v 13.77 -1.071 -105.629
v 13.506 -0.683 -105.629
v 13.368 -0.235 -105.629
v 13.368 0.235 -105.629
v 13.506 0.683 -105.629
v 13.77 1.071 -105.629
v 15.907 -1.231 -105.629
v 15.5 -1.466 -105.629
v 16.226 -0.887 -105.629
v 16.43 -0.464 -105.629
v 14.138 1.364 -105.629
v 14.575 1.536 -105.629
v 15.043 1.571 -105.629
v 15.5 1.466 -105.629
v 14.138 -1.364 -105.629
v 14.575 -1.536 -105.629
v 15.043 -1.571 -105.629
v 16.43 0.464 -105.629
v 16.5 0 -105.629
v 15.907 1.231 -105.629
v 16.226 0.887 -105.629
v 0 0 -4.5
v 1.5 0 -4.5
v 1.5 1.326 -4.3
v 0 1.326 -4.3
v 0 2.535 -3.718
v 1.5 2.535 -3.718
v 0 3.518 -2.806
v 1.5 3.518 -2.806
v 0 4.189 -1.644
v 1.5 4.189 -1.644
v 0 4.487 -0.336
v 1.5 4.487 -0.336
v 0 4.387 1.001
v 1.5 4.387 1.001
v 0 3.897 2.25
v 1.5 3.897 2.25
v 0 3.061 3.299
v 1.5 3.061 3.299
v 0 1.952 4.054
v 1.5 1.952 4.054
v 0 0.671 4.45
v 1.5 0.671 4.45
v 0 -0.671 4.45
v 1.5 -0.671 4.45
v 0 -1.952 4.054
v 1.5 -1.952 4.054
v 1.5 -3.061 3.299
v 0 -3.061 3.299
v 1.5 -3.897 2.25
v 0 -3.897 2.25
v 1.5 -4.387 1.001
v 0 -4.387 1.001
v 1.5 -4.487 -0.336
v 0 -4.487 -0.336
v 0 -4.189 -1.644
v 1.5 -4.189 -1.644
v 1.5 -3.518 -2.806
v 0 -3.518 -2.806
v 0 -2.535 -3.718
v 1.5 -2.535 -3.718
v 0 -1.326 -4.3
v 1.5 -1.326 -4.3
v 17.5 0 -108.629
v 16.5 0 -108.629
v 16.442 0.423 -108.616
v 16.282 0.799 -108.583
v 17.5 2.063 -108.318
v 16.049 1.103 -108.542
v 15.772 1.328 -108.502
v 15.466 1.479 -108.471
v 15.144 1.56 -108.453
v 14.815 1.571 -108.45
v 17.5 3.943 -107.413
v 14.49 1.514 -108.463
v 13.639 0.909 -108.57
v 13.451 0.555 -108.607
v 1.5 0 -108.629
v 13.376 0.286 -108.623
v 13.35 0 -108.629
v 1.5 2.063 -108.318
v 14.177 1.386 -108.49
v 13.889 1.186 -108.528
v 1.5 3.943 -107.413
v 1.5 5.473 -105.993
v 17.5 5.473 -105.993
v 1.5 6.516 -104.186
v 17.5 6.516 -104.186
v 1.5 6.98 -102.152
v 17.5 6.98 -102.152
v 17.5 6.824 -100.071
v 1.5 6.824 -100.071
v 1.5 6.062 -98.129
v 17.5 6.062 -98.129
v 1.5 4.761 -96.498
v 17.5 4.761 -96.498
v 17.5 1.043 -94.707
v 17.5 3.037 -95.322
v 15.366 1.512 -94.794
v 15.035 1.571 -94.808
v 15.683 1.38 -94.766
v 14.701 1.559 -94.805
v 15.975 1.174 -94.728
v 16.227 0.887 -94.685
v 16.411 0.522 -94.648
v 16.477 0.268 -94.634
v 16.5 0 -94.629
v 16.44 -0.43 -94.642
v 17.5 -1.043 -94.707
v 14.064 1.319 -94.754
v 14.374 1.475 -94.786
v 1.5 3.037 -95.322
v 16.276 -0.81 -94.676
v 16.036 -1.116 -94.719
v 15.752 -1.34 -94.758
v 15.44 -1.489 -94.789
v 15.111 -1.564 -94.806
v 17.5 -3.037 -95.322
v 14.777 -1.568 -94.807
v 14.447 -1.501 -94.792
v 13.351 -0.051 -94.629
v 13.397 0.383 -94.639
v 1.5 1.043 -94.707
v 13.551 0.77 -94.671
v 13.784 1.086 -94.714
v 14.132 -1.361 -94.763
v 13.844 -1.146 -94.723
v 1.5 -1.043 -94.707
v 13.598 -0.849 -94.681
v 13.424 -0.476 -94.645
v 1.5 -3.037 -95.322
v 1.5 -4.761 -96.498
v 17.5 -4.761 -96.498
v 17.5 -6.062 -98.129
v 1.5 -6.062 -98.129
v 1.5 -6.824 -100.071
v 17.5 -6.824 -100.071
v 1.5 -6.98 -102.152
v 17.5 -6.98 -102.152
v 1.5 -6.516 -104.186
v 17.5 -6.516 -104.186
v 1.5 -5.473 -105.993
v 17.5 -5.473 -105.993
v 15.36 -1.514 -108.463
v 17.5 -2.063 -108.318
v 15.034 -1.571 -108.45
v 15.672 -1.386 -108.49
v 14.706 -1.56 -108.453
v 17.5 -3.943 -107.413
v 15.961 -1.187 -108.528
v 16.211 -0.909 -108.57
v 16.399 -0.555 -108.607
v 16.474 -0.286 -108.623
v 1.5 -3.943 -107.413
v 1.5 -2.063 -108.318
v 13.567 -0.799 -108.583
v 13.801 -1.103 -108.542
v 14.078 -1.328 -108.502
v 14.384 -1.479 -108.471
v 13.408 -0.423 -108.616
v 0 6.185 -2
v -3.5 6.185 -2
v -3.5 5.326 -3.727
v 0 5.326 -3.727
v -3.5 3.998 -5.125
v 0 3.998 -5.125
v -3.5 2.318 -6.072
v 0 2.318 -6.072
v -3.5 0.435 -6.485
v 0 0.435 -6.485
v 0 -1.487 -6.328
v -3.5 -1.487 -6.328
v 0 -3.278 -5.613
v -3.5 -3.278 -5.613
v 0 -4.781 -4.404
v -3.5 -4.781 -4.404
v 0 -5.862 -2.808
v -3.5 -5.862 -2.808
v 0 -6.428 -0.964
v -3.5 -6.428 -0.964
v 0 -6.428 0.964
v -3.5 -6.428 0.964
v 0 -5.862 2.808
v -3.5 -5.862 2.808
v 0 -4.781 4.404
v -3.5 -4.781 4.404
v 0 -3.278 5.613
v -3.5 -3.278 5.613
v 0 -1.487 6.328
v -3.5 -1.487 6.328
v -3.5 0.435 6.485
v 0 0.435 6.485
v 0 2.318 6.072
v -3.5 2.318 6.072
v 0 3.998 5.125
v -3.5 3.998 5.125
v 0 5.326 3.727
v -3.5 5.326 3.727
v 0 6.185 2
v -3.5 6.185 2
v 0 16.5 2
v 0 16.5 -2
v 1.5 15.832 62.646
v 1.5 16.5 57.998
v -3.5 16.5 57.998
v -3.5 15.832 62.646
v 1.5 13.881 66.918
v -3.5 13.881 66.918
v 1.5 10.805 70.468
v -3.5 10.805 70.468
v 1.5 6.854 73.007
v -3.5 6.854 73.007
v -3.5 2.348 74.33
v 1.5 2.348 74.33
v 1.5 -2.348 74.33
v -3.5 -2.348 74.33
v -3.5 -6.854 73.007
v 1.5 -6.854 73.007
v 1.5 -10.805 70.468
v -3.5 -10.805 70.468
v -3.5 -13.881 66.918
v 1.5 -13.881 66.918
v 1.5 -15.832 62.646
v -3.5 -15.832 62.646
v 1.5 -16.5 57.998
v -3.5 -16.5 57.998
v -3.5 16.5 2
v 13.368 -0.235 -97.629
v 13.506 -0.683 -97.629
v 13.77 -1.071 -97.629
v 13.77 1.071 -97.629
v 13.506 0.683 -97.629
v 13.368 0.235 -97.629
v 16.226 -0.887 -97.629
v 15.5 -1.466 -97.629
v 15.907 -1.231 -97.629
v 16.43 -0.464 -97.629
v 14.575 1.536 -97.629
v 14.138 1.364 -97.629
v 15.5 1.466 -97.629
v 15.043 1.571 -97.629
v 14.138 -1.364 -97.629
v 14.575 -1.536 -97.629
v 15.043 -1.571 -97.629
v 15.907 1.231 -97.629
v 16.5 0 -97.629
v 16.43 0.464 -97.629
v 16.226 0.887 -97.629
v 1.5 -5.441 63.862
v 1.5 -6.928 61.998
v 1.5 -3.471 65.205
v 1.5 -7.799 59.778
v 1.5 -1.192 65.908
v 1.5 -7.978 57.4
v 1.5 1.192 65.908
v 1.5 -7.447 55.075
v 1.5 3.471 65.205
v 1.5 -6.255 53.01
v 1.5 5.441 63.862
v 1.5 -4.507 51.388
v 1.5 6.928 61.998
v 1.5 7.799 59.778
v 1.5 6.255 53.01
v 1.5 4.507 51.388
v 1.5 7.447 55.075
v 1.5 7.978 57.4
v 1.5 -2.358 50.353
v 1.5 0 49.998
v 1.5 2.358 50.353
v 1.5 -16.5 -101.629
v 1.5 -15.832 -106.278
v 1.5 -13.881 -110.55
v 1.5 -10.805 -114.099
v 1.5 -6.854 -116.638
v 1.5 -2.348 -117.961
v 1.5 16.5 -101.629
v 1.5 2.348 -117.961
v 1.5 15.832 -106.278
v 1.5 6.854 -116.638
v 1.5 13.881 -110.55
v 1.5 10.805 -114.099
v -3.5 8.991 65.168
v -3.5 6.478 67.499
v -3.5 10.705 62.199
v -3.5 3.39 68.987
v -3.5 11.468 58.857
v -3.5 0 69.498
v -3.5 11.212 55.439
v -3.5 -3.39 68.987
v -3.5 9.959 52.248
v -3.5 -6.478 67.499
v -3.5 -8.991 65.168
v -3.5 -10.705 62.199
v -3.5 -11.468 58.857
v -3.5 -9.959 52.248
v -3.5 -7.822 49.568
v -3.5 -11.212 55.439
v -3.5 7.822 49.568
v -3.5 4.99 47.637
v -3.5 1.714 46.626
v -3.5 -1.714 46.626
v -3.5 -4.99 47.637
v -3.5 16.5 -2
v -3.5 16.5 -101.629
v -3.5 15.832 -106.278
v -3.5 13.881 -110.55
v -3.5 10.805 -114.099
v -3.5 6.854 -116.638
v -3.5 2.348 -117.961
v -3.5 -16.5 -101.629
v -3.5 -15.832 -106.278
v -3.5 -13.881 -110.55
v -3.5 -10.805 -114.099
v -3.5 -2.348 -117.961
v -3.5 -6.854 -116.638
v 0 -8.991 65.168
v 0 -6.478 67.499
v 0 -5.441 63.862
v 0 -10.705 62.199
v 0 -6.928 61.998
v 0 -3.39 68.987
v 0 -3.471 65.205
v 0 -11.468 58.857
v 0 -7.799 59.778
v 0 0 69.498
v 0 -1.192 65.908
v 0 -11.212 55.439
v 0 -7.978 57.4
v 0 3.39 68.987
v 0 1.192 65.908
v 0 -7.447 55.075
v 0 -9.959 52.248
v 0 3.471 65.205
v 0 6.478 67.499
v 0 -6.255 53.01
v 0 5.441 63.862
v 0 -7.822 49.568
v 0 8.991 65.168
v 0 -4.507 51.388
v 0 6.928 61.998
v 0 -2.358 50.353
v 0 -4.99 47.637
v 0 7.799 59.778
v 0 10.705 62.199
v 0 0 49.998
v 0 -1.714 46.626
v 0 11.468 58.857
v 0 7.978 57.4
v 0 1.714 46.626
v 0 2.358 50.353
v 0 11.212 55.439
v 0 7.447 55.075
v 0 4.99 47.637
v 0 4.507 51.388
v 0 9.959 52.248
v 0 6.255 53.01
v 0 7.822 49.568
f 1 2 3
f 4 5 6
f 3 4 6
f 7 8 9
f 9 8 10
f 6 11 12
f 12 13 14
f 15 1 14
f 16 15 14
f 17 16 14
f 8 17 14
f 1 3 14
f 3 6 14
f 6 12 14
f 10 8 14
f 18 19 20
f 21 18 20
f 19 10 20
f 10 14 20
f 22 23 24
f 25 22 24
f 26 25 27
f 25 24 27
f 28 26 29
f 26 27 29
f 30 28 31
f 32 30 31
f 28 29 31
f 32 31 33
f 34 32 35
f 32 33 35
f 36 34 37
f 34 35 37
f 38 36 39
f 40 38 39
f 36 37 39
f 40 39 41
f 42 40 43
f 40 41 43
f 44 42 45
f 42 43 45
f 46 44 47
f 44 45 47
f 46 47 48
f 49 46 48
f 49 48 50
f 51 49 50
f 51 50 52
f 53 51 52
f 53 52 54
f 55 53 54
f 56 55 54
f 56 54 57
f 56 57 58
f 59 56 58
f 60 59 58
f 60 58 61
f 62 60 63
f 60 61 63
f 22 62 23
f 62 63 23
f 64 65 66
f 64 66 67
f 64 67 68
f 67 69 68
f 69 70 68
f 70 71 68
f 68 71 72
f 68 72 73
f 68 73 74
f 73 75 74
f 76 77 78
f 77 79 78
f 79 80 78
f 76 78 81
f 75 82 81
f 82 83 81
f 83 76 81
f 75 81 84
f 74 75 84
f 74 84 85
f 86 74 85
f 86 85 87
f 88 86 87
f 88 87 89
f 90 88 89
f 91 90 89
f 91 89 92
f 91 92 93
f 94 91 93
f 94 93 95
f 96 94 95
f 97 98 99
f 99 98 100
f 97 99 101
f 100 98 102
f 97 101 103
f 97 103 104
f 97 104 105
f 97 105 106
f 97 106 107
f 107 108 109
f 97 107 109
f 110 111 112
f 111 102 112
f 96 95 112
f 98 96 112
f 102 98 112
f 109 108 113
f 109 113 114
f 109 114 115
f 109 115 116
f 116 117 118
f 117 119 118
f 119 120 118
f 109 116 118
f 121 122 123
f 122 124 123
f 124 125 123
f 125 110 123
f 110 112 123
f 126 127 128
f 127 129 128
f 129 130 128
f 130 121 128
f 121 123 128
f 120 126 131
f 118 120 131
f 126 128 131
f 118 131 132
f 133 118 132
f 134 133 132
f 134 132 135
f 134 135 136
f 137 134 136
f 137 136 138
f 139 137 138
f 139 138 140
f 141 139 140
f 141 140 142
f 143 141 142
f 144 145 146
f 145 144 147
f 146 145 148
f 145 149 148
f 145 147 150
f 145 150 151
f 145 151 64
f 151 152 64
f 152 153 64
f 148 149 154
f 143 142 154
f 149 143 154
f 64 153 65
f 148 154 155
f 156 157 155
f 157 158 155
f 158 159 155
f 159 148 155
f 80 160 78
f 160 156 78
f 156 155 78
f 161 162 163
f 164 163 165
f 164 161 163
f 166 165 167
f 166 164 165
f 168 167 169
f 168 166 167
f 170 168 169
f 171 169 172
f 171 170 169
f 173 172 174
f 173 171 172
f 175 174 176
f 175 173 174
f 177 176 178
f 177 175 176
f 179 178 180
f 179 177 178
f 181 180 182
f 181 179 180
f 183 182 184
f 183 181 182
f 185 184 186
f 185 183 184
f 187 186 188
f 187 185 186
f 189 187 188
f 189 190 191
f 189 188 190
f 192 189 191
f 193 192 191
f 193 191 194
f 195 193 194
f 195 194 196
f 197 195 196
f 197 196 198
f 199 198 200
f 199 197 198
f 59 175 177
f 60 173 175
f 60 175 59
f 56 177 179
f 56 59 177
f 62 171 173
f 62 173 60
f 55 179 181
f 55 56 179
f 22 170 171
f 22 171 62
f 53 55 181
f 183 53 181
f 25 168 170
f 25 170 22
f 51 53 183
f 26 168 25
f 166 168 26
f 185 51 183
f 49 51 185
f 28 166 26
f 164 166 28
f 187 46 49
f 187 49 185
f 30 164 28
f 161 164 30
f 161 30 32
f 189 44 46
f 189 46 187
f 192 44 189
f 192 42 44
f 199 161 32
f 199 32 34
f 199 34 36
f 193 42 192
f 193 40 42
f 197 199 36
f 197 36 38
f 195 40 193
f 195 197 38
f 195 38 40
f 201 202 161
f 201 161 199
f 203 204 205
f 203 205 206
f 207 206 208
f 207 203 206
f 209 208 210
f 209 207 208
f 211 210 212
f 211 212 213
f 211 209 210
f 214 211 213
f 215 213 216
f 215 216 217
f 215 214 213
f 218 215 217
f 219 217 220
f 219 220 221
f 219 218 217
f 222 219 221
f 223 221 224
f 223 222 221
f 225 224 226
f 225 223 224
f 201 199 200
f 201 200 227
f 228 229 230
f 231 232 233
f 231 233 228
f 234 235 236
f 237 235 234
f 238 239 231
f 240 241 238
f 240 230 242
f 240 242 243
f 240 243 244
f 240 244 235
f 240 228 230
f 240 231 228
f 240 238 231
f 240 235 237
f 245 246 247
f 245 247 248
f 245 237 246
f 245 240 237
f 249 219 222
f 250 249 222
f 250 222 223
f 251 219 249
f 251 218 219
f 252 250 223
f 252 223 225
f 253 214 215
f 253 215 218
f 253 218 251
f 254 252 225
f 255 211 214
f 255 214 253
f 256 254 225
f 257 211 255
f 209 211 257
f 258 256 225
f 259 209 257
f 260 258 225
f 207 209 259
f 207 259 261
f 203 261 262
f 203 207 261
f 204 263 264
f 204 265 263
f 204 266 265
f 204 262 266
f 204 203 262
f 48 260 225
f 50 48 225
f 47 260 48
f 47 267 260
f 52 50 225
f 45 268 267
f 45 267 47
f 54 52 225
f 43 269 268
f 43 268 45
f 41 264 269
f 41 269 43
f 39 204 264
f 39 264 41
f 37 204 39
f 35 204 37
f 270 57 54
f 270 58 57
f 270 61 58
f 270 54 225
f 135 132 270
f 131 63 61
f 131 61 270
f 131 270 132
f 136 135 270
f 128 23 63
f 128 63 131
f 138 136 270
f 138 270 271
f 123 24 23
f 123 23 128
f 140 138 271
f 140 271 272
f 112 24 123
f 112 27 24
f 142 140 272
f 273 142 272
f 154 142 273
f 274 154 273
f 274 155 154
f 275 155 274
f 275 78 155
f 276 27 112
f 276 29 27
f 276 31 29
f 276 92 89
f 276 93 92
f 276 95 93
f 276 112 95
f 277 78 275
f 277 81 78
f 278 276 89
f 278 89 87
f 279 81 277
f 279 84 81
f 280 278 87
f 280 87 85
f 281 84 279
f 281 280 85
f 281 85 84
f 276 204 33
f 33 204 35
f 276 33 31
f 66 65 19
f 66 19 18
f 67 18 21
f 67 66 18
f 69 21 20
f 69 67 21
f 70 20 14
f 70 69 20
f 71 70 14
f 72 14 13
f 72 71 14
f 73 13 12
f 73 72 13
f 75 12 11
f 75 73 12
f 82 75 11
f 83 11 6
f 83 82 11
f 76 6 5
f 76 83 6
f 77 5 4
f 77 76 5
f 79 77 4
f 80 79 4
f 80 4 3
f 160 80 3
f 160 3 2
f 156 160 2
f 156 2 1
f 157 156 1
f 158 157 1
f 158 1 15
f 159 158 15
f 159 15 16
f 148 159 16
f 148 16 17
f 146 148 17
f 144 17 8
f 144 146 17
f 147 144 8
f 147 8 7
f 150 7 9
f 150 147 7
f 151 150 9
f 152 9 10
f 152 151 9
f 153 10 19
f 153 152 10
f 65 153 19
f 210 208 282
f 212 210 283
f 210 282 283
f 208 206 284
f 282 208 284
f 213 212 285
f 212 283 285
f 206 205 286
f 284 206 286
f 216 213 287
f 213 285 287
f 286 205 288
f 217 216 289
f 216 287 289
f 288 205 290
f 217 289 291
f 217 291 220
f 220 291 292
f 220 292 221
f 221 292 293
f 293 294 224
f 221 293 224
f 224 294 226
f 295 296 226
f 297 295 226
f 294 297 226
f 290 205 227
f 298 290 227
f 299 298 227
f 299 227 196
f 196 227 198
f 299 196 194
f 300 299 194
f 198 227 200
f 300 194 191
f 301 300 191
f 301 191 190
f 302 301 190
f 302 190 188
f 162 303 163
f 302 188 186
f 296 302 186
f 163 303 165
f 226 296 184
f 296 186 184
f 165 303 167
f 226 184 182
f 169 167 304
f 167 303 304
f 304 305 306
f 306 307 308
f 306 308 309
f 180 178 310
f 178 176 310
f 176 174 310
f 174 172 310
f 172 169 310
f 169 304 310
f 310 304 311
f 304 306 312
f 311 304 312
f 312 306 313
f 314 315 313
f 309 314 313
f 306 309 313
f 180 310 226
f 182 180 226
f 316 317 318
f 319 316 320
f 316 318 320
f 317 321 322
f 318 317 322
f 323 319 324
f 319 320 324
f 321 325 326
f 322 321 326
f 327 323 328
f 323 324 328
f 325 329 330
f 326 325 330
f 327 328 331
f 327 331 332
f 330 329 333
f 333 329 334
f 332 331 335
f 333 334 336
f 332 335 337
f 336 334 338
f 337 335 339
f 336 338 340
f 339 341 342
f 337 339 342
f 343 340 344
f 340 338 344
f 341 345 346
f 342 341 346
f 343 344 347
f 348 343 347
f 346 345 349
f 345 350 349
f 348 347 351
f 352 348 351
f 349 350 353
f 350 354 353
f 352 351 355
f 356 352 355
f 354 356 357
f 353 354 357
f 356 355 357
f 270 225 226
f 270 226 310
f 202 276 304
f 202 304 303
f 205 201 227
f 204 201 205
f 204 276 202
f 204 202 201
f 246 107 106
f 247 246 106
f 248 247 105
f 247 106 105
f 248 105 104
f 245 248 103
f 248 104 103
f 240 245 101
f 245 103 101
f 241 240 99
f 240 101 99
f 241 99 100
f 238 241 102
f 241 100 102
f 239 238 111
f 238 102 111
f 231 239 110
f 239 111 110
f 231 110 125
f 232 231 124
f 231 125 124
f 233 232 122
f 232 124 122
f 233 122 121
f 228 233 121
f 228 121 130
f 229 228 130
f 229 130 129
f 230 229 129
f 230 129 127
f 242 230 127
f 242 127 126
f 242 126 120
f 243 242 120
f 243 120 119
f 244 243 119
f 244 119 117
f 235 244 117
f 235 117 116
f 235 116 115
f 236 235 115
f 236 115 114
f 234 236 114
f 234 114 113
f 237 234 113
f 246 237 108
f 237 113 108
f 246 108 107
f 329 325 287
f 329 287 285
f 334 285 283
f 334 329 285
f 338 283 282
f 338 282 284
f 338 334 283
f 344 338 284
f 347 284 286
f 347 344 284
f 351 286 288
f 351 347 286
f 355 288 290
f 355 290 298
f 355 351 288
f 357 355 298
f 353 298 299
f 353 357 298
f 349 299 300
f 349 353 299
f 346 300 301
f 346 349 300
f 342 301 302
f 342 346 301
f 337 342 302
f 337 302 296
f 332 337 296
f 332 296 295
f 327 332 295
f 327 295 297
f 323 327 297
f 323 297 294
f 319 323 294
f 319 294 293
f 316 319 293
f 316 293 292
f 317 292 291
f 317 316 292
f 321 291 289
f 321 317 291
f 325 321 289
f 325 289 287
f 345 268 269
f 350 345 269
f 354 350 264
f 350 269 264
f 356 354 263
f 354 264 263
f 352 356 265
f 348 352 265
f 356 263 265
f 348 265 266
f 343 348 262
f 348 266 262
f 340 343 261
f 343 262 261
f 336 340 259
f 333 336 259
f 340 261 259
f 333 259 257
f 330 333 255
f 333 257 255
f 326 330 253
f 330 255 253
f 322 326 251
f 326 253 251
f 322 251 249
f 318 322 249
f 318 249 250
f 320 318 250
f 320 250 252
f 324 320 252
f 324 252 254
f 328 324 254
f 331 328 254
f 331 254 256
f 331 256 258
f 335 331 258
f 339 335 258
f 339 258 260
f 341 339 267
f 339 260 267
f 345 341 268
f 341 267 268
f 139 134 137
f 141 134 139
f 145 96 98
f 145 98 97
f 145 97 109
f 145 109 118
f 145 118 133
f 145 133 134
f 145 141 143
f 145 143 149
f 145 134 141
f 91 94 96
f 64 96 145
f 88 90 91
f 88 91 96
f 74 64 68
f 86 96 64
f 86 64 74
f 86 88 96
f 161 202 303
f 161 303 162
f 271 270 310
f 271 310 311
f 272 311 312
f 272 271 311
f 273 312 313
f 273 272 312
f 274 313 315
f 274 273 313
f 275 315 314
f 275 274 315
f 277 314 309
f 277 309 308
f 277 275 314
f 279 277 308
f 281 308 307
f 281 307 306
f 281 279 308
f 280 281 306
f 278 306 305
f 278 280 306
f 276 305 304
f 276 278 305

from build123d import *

# Parameters (mm, degrees)
SKETCH3_R           = 6.5
SKETCH3_R_2         = 11.5
BOSS_EXTRUDE2_DEPTH = 3.5
BOSS_EXTRUDE3_START = 1.5
SKETCH4_R           = 8
SKETCH4_R_2         = 4.5
BOSS_EXTRUDE3_DEPTH = 1.5
SKETCH6_R           = 7
BOSS_EXTRUDE4_DEPTH = 16
CUT_EXTRUDE1_START  = -3.5
CUT_EXTRUDE1_DEPTH  = 3.5
SKETCH8_R           = 1.575
CUT_EXTRUDE2_DEPTH  = 3


with BuildPart() as part:
    # Sketch3 → Boss-Extrude2 (new body)
    with BuildSketch(Plane(origin=(0, 20, 0), x_dir=(0, 1, 0), z_dir=(-1, 0, 0))):
        with BuildLine():
            Line((-3.5, 101.628977271), (-3.5, -57.9976886))
            ThreePointArc((-3.5, -57.9976886), (-20, -74.4976886), (-36.5, -57.9976886))
            Line((-36.5, -57.9976886), (-36.5, 101.628977271))
            ThreePointArc((-36.5, 101.628977271), (-20, 118.128977271), (-3.5, 101.628977271))
        make_face()
        with Locations(Location((-20, 0, 0), (0, 0, 270))):
            Circle(SKETCH3_R, mode=Mode.SUBTRACT)
        with Locations(Location((-20, -57.9976886, 0), (0, 0, 270))):
            Circle(SKETCH3_R_2, mode=Mode.SUBTRACT)
    extrude(amount=BOSS_EXTRUDE2_DEPTH)

    # Sketch4 → Boss-Extrude3 (add)
    with BuildSketch(Plane(origin=(0, 0, 0), x_dir=(0, 0, -1), z_dir=(1, 0, 0)).offset(BOSS_EXTRUDE3_START)):
        with BuildLine():
            Line((101.628977271, 16.5), (-57.9976886, 16.5))
            ThreePointArc((-57.9976886, 16.5), (-74.4976886, 0), (-57.9976886, -16.5))
            Line((-57.9976886, -16.5), (101.628977271, -16.5))
            ThreePointArc((101.628977271, -16.5), (118.128977271, 0), (101.628977271, 16.5))
        make_face()
        with Locations((-57.9976886, 0)):
            Circle(SKETCH4_R, mode=Mode.SUBTRACT)
        Circle(SKETCH4_R_2, mode=Mode.SUBTRACT)
    extrude(amount=-BOSS_EXTRUDE3_DEPTH)

    # Sketch6 → Boss-Extrude4 (add)
    with BuildSketch(Plane(origin=(1.5, 0, 0), x_dir=(0, 0, -1), z_dir=(1, 0, 0))):
        with Locations((101.628977271, 0)):
            Circle(SKETCH6_R)
    extrude(amount=BOSS_EXTRUDE4_DEPTH)

    # Sketch7 → Cut-Extrude1 (cut)
    with BuildSketch(Plane.ZY.offset(3.5).offset(CUT_EXTRUDE1_START)):
        with BuildLine():
            Line((-2, 16.5), (-2, 6.184658438))
            ThreePointArc((-2, 6.184658438), (0, 6.5), (2, 6.184658438))
            Line((2, 6.184658438), (2, 16.5))
            Line((2, 16.5), (-2, 16.5))
        make_face()
    extrude(amount=CUT_EXTRUDE1_DEPTH, mode=Mode.SUBTRACT)

    # Sketch8 → Cut-Extrude2 (cut)
    with BuildSketch(Plane.XY.offset(-94.628977271)):
        with Locations((14.925, 0)):
            Circle(SKETCH8_R)
    cut_extrude2 = extrude(amount=-CUT_EXTRUDE2_DEPTH, mode=Mode.SUBTRACT)

    # Mirror1: Cut-Extrude2 across plane
    add(cut_extrude2.mirror(Plane.XY.offset(-101.628977271)), mode=Mode.SUBTRACT)


solid = part.part
